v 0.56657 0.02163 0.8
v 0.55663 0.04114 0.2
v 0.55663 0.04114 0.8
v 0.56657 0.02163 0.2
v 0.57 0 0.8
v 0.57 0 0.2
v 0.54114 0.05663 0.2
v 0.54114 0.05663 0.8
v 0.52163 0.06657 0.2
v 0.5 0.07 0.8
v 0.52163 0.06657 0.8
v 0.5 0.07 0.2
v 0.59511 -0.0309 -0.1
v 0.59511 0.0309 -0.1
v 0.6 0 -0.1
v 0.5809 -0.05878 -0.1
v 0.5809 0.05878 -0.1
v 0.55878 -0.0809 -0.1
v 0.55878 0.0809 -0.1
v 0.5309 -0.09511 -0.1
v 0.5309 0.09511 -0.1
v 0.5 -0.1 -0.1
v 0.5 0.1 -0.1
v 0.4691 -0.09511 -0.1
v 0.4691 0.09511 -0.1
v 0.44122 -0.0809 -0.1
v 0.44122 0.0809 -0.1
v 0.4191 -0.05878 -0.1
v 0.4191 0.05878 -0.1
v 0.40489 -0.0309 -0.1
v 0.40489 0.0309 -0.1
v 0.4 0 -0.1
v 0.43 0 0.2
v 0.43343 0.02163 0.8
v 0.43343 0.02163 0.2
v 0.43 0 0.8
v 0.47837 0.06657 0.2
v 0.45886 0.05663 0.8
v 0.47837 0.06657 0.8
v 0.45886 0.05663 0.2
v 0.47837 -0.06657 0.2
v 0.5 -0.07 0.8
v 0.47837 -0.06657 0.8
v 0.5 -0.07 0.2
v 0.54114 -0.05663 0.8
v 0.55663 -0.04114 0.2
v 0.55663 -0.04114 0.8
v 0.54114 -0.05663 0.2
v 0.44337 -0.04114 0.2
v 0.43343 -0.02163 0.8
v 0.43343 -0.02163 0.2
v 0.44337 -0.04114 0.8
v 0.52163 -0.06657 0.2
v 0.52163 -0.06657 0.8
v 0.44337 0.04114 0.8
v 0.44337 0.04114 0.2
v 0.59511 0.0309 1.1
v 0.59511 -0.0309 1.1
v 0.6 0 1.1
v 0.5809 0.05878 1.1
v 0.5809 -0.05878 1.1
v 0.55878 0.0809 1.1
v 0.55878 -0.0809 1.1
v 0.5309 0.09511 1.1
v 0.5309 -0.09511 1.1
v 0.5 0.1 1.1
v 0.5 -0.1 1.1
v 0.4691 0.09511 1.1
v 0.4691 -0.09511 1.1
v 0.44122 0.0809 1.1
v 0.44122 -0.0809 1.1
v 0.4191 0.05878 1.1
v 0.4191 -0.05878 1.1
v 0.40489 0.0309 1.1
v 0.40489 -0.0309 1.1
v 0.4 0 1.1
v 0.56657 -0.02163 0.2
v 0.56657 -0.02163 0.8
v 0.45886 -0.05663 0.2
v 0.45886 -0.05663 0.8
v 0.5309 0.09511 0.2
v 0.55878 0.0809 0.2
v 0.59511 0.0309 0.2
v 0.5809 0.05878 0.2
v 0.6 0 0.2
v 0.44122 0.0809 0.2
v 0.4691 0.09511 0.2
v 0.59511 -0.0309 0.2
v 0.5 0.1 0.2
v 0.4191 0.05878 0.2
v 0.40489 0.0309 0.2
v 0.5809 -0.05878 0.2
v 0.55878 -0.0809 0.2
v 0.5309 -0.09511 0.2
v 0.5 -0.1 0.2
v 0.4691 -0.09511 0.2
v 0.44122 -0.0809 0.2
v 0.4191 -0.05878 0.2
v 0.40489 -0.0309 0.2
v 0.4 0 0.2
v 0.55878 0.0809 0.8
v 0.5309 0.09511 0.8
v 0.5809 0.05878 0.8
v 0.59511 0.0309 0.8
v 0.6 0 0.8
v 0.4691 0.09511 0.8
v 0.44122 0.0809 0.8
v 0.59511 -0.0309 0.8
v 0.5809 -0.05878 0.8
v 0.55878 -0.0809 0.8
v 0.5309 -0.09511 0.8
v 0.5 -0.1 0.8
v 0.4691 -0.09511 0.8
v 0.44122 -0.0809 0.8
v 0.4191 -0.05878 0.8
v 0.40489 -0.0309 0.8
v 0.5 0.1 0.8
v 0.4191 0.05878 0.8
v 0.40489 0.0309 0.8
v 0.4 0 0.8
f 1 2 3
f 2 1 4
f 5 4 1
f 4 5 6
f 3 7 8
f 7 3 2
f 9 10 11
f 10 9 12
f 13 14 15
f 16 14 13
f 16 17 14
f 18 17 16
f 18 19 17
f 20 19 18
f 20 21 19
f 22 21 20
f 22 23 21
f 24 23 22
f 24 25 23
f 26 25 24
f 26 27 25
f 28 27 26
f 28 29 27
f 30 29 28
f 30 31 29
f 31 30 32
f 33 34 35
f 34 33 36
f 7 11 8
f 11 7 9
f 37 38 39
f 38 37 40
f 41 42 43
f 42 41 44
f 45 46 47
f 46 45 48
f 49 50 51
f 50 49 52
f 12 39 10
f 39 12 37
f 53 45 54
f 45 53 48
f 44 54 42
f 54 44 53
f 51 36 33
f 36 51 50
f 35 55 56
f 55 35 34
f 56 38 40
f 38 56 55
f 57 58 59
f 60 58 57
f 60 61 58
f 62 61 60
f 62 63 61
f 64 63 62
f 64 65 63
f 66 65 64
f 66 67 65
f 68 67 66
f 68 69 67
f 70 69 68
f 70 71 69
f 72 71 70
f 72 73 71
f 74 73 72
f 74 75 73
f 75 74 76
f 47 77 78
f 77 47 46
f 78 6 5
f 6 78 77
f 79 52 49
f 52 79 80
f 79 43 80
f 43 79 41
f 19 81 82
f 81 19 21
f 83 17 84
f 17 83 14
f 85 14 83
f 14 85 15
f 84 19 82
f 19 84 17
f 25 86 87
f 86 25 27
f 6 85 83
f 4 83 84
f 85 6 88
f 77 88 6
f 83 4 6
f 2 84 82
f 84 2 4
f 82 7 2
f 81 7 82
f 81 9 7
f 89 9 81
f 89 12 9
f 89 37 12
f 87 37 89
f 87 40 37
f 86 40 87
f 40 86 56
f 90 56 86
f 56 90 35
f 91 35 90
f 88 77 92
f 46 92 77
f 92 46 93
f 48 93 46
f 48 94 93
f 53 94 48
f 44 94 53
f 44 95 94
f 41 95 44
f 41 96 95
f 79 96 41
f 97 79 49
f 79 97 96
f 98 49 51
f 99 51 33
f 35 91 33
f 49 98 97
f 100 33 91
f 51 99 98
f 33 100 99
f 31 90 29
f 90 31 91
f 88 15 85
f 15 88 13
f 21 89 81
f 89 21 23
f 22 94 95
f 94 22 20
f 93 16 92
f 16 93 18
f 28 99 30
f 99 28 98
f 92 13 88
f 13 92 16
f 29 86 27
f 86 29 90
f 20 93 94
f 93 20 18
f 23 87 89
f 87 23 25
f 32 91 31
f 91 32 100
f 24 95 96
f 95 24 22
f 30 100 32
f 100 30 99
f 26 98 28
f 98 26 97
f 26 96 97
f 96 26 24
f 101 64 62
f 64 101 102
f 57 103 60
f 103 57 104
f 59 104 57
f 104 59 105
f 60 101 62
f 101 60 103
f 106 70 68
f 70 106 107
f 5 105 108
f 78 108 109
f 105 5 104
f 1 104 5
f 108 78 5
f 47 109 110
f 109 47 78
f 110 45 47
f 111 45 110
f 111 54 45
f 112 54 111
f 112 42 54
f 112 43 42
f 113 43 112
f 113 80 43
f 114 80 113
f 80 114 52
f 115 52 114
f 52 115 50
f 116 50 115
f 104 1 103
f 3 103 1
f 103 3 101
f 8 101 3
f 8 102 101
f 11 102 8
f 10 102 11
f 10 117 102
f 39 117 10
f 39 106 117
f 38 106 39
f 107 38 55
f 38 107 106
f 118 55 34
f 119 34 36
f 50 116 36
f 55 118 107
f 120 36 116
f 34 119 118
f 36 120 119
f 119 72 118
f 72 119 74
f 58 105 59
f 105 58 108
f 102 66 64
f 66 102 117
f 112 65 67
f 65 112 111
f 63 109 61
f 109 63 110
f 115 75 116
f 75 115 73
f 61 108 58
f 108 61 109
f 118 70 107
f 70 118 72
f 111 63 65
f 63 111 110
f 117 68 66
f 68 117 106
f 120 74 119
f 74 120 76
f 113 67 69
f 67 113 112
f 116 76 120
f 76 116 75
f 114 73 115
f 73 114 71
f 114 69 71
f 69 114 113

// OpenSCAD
color([0.3, 0.3, 0.5])
translate([0.5, 0, -0.1]) {
    cylinder(h = 1.2, r = 0.07, $fn = 20);
    cylinder(h = 0.3, r = 0.1, $fn = 20);
    translate([0,0,0.9])
    cylinder(h = 0.3, r = 0.1, $fn = 20);


}
